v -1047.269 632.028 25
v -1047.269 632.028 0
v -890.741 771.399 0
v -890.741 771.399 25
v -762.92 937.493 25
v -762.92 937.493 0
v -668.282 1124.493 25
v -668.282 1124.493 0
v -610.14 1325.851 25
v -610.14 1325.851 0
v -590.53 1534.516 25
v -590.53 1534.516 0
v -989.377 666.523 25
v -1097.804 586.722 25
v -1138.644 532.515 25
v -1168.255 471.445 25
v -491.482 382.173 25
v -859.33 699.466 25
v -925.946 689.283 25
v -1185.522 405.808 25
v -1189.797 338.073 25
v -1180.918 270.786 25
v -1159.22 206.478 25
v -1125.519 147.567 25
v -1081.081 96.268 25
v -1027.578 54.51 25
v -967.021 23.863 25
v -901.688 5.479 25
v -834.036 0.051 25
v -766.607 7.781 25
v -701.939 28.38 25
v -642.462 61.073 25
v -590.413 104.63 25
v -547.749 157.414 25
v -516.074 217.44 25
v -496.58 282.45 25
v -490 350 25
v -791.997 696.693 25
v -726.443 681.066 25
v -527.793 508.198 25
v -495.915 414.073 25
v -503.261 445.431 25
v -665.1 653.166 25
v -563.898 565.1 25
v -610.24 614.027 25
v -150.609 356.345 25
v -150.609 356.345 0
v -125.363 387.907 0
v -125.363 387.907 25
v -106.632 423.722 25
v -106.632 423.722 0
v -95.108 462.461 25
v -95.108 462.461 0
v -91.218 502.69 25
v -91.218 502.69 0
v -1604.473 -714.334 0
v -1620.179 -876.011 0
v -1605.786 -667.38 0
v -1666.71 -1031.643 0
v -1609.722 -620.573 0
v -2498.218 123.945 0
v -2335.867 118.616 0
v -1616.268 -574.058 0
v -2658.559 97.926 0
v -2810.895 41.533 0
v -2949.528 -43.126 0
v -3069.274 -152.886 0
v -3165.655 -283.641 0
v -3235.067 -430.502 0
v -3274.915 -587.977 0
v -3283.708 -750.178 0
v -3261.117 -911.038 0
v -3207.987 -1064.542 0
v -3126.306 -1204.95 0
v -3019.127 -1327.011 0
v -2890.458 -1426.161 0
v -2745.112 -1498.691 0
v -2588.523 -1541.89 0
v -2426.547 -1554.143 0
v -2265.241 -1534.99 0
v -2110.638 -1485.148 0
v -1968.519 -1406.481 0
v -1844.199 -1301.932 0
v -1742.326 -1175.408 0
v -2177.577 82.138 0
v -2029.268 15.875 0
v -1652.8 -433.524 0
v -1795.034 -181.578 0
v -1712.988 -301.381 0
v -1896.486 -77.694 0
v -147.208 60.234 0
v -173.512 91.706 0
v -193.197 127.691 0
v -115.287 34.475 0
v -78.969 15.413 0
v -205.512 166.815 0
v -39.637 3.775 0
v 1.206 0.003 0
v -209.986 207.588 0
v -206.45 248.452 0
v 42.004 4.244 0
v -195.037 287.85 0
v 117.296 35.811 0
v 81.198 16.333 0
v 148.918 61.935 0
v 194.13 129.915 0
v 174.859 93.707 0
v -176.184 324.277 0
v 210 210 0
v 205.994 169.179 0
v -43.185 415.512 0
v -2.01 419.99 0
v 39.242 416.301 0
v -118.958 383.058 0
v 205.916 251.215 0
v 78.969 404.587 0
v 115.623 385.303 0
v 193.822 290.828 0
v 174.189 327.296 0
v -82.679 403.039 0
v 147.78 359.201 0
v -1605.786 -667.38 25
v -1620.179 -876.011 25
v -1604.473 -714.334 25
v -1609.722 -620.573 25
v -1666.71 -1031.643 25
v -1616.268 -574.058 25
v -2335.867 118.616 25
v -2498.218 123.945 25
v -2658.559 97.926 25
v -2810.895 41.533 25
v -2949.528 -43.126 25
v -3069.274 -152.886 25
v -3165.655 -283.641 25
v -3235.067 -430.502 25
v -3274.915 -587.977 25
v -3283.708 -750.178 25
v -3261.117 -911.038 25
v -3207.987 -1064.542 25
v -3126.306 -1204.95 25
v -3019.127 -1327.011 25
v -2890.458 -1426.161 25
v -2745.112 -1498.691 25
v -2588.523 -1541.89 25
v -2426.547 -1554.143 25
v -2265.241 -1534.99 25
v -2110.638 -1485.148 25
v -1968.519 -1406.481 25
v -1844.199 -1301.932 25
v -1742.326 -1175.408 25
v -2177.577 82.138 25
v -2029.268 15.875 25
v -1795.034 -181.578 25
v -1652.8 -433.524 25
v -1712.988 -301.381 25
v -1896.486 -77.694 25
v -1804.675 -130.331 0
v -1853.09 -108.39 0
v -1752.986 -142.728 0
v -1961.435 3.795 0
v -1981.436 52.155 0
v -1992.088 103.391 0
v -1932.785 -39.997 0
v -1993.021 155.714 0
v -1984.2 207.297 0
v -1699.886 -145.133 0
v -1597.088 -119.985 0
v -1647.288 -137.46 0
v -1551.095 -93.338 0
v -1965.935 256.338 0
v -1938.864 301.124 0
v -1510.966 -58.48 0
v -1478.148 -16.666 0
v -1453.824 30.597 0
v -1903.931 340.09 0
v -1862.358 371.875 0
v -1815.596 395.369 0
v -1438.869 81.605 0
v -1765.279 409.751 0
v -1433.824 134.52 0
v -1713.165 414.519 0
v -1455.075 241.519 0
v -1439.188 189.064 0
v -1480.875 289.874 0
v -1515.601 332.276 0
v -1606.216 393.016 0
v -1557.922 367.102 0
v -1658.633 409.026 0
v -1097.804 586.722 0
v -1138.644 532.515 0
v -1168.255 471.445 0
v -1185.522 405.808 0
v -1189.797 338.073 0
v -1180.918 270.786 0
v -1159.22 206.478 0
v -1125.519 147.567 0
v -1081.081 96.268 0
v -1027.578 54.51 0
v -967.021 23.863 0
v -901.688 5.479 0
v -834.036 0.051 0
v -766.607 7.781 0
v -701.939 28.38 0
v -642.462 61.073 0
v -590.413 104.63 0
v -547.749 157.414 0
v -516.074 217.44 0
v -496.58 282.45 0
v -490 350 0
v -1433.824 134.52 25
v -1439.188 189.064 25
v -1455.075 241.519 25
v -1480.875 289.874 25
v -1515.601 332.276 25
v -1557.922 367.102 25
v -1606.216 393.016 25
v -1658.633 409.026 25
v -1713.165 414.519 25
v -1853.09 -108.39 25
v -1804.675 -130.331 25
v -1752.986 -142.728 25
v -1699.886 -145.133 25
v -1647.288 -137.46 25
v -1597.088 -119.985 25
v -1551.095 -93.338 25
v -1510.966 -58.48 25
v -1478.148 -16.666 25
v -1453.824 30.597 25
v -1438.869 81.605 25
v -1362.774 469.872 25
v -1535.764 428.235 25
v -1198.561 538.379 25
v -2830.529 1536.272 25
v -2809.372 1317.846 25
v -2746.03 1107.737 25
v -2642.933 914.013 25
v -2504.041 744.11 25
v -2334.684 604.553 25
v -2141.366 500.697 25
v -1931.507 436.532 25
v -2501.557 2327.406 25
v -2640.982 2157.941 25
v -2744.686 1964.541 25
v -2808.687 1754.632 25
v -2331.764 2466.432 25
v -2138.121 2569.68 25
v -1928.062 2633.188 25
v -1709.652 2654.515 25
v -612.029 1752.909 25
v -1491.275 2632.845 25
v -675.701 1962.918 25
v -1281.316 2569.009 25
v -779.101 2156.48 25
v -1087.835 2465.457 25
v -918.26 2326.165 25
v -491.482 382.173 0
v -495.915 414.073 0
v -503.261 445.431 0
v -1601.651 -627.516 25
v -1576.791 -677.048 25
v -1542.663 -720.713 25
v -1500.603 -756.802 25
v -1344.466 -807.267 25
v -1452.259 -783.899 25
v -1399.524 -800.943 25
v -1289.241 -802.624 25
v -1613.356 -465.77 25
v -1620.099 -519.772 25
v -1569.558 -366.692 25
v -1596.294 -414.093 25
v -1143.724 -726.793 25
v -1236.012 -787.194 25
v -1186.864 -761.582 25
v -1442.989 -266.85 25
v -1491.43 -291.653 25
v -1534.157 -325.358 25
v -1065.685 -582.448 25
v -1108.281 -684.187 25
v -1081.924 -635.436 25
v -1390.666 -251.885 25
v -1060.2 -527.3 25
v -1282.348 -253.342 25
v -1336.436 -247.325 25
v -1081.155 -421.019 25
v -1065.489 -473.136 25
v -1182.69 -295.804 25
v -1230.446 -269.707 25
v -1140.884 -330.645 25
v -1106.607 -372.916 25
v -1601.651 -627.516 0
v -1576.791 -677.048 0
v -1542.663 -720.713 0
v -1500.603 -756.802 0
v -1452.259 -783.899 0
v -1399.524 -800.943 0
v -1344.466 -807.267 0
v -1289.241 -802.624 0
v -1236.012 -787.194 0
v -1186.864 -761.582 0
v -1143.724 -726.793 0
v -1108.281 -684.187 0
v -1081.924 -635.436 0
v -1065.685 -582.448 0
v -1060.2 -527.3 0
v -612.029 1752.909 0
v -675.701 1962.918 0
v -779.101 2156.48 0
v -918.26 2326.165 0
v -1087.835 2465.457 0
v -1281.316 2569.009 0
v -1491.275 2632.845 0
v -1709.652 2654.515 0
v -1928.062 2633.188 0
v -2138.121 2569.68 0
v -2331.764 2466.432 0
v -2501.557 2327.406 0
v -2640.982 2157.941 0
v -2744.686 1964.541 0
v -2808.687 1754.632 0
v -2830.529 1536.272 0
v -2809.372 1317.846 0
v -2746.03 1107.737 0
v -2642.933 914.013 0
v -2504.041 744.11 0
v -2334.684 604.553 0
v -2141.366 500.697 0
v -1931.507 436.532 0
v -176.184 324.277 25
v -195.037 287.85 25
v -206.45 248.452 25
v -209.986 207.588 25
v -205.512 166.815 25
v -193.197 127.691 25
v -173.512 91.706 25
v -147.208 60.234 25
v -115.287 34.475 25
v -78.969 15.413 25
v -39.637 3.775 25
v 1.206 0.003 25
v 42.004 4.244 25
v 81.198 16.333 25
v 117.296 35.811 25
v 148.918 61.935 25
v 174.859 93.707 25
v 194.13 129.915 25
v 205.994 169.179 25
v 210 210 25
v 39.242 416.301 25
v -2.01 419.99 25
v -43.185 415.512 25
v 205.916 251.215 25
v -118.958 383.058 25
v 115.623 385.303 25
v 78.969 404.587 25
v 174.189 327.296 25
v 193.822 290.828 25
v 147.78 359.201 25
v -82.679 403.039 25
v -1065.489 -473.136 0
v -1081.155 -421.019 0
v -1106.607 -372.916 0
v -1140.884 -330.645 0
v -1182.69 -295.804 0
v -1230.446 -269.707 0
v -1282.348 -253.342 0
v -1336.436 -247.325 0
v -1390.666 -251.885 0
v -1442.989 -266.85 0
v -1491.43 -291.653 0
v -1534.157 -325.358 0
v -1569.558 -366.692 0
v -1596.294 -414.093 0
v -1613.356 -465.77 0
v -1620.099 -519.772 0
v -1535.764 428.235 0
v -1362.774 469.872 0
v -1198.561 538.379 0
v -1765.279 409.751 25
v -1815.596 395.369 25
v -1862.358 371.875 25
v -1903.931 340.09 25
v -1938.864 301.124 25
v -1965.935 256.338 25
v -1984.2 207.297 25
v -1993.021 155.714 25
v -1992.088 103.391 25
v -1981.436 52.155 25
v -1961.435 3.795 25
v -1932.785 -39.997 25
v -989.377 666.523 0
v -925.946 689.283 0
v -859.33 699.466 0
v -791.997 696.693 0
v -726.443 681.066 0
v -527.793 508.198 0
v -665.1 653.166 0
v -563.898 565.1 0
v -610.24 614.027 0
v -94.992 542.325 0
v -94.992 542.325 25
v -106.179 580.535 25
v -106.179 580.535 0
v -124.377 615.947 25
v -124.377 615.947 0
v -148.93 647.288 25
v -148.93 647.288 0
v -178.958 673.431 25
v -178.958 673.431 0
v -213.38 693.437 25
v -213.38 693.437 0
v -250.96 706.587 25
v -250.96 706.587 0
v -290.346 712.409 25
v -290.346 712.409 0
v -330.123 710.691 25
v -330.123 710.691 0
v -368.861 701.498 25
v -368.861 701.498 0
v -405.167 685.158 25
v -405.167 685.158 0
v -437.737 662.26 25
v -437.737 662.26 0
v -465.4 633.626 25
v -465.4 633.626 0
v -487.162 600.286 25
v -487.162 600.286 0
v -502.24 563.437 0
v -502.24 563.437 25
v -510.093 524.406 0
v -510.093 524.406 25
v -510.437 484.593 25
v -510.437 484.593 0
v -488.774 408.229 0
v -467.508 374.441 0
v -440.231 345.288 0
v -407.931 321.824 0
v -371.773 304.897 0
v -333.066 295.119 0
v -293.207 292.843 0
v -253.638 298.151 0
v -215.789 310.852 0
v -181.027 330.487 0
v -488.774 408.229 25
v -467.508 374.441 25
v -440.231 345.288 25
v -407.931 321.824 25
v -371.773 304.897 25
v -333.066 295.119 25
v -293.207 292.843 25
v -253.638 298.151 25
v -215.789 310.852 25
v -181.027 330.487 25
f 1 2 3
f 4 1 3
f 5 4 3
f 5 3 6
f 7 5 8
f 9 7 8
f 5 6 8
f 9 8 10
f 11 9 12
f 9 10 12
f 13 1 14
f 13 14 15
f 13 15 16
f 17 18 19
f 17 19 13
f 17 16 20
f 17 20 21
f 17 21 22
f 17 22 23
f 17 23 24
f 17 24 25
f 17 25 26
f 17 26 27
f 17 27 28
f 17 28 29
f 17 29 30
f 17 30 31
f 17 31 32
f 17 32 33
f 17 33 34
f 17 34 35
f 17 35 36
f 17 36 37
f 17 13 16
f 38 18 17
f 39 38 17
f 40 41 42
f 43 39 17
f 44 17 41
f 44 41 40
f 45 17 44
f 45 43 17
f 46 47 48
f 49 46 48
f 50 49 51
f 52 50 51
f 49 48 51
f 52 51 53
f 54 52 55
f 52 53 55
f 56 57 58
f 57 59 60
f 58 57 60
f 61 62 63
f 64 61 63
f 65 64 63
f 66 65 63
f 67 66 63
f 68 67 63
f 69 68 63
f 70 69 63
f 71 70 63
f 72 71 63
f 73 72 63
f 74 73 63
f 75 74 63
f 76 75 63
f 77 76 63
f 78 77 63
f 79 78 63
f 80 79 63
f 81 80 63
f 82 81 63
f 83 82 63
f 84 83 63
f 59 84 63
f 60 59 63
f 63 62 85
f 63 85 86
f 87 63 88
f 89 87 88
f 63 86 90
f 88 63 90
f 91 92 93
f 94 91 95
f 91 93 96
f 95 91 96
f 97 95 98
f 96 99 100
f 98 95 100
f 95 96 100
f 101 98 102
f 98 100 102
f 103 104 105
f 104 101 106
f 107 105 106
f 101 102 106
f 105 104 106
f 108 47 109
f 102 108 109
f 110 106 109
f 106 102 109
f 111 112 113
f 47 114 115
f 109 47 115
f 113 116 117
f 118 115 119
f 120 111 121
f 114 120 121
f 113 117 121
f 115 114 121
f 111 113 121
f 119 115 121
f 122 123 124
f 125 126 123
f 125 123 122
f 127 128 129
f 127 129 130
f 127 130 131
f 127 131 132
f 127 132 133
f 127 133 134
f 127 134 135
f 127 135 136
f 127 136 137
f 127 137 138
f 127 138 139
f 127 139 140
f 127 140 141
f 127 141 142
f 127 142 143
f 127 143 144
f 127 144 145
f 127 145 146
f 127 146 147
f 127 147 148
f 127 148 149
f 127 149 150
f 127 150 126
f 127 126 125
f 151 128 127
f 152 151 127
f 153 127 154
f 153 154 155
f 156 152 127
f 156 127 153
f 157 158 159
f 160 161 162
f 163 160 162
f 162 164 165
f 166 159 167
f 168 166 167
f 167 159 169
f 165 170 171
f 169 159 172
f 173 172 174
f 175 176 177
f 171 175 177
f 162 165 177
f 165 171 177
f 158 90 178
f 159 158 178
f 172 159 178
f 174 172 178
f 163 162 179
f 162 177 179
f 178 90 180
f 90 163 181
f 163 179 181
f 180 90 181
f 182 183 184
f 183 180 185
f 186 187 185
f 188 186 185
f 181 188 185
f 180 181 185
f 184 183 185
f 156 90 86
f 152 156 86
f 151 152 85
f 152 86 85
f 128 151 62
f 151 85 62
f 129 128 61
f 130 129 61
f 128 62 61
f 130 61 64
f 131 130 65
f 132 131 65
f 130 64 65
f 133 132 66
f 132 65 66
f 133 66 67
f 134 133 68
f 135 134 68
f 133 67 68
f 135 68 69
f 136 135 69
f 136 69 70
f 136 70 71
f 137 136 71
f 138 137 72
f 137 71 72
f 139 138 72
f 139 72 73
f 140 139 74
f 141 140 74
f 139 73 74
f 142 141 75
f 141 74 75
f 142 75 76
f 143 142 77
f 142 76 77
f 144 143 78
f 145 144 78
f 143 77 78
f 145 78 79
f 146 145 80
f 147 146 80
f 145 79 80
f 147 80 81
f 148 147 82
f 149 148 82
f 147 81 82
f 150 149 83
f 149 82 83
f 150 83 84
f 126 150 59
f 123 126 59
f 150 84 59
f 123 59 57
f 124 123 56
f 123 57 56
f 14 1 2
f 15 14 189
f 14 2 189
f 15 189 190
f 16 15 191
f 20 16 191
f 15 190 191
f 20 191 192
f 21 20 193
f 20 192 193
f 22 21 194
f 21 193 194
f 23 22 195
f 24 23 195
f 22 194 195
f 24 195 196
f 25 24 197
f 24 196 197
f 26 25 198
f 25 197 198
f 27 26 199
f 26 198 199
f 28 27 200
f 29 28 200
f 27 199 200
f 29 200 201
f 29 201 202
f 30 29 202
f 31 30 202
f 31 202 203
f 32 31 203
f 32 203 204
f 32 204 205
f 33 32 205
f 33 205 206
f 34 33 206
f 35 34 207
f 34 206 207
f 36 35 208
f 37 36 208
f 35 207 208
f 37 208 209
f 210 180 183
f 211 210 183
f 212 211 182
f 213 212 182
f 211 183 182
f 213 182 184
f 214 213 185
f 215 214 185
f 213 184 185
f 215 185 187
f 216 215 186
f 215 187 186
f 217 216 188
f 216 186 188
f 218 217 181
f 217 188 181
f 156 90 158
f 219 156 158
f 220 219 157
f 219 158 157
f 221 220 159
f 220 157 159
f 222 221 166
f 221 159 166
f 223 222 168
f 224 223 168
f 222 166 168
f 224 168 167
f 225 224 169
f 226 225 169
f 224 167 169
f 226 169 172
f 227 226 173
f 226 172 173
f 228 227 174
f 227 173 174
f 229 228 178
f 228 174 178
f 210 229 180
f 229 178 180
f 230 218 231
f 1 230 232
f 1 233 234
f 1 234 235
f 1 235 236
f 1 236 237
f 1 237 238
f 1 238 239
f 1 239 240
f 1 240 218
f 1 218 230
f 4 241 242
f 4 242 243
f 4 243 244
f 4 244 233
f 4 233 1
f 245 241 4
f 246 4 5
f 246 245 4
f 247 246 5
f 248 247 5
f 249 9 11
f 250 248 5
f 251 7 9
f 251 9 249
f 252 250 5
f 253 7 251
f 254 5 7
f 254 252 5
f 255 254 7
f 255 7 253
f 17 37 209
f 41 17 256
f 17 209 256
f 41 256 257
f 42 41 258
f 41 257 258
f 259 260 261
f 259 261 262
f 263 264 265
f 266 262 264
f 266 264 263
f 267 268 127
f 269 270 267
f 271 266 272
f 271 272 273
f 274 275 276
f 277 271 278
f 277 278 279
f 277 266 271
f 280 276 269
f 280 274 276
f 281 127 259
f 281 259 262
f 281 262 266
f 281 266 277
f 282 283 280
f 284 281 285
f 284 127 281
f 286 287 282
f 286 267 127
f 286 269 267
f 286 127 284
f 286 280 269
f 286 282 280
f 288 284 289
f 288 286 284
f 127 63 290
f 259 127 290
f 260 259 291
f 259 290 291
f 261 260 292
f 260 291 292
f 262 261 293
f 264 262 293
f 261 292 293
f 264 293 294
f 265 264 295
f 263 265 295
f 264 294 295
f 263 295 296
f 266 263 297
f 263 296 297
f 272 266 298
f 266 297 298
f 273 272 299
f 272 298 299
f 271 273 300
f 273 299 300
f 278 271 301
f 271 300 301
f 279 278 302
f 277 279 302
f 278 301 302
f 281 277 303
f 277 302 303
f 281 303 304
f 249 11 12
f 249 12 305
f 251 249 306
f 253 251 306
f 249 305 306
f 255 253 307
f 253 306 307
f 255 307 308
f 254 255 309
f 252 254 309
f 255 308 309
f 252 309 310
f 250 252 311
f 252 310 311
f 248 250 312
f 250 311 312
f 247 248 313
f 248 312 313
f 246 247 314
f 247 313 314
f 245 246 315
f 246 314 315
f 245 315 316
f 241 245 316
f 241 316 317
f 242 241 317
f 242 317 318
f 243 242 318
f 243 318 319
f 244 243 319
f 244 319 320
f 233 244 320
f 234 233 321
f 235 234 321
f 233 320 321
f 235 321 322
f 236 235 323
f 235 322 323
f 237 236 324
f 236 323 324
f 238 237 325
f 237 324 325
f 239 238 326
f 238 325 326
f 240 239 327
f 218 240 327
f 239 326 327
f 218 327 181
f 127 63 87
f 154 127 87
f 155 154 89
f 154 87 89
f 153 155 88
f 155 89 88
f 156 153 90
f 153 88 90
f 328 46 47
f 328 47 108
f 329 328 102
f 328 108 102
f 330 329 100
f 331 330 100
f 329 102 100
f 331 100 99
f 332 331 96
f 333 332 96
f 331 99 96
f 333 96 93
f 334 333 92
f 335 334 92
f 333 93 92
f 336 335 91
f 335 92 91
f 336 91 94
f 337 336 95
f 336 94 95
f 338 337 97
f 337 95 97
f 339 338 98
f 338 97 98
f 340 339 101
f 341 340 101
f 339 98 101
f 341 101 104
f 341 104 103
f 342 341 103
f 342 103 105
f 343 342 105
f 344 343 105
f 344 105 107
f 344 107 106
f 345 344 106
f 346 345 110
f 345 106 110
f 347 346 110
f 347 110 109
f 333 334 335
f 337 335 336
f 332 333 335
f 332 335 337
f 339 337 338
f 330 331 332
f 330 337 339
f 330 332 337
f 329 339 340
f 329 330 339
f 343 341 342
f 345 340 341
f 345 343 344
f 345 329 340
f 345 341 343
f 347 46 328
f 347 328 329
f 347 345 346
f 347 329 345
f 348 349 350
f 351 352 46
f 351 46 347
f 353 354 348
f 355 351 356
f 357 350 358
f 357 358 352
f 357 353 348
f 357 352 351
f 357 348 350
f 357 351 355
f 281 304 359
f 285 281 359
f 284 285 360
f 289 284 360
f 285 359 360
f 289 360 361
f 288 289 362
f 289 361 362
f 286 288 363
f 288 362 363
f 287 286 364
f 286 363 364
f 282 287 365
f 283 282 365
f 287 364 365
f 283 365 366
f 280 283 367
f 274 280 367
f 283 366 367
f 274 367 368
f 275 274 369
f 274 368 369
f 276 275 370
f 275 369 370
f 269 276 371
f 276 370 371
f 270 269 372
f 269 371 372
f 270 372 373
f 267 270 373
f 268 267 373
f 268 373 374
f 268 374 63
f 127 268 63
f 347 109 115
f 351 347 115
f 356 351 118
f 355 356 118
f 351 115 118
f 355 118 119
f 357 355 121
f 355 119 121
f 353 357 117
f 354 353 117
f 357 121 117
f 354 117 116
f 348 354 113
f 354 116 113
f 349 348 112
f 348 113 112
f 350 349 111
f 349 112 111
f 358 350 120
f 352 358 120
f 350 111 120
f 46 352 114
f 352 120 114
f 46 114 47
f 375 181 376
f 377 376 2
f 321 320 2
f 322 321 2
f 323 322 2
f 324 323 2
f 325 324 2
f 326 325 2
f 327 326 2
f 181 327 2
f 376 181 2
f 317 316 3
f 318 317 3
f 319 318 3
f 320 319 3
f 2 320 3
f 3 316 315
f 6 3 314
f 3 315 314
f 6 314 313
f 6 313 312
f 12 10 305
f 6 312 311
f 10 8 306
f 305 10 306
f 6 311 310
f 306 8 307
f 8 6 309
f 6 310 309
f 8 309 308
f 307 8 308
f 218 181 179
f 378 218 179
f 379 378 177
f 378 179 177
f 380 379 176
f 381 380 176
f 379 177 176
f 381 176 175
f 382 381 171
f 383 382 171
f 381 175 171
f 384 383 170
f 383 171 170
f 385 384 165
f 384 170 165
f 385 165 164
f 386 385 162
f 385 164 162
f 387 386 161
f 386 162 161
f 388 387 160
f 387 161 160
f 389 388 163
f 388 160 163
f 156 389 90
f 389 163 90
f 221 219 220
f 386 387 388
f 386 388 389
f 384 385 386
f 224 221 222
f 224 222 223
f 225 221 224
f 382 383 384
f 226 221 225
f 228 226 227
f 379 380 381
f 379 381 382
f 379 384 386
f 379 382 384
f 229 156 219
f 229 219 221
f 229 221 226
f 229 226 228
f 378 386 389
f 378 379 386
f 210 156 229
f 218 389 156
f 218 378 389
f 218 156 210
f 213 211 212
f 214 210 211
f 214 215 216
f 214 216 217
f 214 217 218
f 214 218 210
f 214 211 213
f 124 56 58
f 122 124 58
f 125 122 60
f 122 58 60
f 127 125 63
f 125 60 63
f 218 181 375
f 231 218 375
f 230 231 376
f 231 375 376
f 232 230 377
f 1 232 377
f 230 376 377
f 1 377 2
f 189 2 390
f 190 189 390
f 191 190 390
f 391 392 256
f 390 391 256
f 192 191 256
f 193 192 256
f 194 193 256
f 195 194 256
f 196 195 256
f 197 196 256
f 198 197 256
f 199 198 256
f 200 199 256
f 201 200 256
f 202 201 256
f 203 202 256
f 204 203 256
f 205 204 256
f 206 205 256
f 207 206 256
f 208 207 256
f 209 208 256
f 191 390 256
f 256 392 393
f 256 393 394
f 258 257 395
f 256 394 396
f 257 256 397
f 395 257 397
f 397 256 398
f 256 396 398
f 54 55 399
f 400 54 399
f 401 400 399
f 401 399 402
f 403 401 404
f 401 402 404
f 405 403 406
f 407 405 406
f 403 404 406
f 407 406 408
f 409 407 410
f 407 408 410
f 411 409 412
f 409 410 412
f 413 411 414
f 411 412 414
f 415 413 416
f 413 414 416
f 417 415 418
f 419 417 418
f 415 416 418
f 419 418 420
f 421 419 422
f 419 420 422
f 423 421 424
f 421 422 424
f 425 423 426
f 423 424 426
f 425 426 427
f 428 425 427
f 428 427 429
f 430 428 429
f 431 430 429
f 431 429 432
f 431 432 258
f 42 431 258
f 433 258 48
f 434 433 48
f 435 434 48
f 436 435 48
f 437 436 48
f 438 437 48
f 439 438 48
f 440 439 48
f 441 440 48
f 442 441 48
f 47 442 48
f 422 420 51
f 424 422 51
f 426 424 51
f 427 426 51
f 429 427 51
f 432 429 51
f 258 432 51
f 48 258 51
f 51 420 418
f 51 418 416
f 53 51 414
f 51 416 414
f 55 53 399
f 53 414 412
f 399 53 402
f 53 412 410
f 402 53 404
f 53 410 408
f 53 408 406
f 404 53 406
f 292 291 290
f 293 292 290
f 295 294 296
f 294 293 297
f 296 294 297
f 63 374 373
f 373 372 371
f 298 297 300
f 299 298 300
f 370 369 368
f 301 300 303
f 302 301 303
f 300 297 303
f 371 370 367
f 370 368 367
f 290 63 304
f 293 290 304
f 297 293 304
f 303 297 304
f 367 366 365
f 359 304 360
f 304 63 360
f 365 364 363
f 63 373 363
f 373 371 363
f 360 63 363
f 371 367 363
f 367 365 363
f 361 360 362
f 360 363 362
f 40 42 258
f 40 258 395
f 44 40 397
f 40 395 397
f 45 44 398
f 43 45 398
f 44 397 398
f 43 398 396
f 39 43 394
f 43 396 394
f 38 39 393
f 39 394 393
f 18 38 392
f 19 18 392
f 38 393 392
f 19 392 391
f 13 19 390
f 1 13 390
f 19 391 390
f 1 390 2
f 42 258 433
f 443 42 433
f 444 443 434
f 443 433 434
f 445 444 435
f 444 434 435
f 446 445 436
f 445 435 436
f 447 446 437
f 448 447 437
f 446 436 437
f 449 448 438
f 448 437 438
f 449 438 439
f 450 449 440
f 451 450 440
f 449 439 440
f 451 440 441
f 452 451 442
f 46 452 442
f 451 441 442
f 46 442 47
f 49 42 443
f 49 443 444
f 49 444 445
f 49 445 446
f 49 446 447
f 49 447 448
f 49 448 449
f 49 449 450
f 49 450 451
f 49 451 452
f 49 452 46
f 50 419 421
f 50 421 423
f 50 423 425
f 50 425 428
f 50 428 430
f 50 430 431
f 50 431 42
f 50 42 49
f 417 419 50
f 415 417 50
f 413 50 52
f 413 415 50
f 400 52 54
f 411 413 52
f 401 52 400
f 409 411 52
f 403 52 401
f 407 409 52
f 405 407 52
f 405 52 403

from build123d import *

# Parameters (mm, degrees)
F1_DEPTH = 25


with BuildPart() as f1:
    # F0 (on Top) → F1 (new body)
    with BuildSketch(Plane.XY):
        with BuildLine():
            ThreePointArc((-150.609154, 356.345081), (-78.968594, 15.413358), (210, 210))
            ThreePointArc((210, 210), (78.968594, 404.586642), (-150.609154, 356.345081))
        make_face()
        with BuildLine():
            ThreePointArc((-1060.2, -527.3), (-1363.661747, -248.284684), (-1616.268189, -574.058476))
            ThreePointArc((-1616.268189, -574.058476), (-1316.738253, -806.315316), (-1060.2, -527.3))
        make_face()
        with BuildLine():
            ThreePointArc((-1616.268189, -574.058476), (-1712.987932, -301.381162), (-1896.486103, -77.693775))
            ThreePointArc((-1896.486103, -77.693775), (-3207.987262, -1064.541826), (-1604.472759, -714.333881))
            ThreePointArc((-1604.472759, -714.333881), (-1607.426811, -643.948653), (-1616.268189, -574.058476))
        make_face()
        with BuildLine():
            ThreePointArc((-1433.823894, 134.519602), (-1515.60122, 332.276452), (-1713.16512, 414.518827))
            ThreePointArc((-1713.16512, 414.518827), (-1976.216013, 232.245628), (-1896.486103, -77.693775))
            ThreePointArc((-1896.486103, -77.693775), (-1597.087907, -119.98523), (-1433.823894, 134.519602))
        make_face()
        with BuildLine():
            ThreePointArc((-1713.16512, 414.518827), (-1362.774148, 469.872189), (-1047.269052, 632.027552))
            ThreePointArc((-1047.269052, 632.027552), (-711.217175, 1028.77482), (-590.530006, 1534.515727))
            ThreePointArc((-590.530006, 1534.515727), (-2501.557399, 2327.406428), (-1713.16512, 414.518827))
        make_face()
        with BuildLine():
            ThreePointArc((-490, 350), (-493.331213, 398.174184), (-503.26144, 445.431349))
            ThreePointArc((-503.26144, 445.431349), (-726.4433, 681.066271), (-1047.269052, 632.027552))
            ThreePointArc((-1047.269052, 632.027552), (-998.044032, 37.714739), (-490, 350))
        make_face()
        with BuildLine():
            ThreePointArc((-503.26144, 445.431349), (-352.652287, 299.08627), (-150.609154, 356.345081))
            ThreePointArc((-150.609154, 356.345081), (-106.631665, 423.721569), (-91.218306, 502.690164))
            ThreePointArc((-91.218306, 502.690164), (-330.12282, 710.691436), (-503.26144, 445.431349))
        make_face()
    extrude(amount=F1_DEPTH)


solid = f1.part
